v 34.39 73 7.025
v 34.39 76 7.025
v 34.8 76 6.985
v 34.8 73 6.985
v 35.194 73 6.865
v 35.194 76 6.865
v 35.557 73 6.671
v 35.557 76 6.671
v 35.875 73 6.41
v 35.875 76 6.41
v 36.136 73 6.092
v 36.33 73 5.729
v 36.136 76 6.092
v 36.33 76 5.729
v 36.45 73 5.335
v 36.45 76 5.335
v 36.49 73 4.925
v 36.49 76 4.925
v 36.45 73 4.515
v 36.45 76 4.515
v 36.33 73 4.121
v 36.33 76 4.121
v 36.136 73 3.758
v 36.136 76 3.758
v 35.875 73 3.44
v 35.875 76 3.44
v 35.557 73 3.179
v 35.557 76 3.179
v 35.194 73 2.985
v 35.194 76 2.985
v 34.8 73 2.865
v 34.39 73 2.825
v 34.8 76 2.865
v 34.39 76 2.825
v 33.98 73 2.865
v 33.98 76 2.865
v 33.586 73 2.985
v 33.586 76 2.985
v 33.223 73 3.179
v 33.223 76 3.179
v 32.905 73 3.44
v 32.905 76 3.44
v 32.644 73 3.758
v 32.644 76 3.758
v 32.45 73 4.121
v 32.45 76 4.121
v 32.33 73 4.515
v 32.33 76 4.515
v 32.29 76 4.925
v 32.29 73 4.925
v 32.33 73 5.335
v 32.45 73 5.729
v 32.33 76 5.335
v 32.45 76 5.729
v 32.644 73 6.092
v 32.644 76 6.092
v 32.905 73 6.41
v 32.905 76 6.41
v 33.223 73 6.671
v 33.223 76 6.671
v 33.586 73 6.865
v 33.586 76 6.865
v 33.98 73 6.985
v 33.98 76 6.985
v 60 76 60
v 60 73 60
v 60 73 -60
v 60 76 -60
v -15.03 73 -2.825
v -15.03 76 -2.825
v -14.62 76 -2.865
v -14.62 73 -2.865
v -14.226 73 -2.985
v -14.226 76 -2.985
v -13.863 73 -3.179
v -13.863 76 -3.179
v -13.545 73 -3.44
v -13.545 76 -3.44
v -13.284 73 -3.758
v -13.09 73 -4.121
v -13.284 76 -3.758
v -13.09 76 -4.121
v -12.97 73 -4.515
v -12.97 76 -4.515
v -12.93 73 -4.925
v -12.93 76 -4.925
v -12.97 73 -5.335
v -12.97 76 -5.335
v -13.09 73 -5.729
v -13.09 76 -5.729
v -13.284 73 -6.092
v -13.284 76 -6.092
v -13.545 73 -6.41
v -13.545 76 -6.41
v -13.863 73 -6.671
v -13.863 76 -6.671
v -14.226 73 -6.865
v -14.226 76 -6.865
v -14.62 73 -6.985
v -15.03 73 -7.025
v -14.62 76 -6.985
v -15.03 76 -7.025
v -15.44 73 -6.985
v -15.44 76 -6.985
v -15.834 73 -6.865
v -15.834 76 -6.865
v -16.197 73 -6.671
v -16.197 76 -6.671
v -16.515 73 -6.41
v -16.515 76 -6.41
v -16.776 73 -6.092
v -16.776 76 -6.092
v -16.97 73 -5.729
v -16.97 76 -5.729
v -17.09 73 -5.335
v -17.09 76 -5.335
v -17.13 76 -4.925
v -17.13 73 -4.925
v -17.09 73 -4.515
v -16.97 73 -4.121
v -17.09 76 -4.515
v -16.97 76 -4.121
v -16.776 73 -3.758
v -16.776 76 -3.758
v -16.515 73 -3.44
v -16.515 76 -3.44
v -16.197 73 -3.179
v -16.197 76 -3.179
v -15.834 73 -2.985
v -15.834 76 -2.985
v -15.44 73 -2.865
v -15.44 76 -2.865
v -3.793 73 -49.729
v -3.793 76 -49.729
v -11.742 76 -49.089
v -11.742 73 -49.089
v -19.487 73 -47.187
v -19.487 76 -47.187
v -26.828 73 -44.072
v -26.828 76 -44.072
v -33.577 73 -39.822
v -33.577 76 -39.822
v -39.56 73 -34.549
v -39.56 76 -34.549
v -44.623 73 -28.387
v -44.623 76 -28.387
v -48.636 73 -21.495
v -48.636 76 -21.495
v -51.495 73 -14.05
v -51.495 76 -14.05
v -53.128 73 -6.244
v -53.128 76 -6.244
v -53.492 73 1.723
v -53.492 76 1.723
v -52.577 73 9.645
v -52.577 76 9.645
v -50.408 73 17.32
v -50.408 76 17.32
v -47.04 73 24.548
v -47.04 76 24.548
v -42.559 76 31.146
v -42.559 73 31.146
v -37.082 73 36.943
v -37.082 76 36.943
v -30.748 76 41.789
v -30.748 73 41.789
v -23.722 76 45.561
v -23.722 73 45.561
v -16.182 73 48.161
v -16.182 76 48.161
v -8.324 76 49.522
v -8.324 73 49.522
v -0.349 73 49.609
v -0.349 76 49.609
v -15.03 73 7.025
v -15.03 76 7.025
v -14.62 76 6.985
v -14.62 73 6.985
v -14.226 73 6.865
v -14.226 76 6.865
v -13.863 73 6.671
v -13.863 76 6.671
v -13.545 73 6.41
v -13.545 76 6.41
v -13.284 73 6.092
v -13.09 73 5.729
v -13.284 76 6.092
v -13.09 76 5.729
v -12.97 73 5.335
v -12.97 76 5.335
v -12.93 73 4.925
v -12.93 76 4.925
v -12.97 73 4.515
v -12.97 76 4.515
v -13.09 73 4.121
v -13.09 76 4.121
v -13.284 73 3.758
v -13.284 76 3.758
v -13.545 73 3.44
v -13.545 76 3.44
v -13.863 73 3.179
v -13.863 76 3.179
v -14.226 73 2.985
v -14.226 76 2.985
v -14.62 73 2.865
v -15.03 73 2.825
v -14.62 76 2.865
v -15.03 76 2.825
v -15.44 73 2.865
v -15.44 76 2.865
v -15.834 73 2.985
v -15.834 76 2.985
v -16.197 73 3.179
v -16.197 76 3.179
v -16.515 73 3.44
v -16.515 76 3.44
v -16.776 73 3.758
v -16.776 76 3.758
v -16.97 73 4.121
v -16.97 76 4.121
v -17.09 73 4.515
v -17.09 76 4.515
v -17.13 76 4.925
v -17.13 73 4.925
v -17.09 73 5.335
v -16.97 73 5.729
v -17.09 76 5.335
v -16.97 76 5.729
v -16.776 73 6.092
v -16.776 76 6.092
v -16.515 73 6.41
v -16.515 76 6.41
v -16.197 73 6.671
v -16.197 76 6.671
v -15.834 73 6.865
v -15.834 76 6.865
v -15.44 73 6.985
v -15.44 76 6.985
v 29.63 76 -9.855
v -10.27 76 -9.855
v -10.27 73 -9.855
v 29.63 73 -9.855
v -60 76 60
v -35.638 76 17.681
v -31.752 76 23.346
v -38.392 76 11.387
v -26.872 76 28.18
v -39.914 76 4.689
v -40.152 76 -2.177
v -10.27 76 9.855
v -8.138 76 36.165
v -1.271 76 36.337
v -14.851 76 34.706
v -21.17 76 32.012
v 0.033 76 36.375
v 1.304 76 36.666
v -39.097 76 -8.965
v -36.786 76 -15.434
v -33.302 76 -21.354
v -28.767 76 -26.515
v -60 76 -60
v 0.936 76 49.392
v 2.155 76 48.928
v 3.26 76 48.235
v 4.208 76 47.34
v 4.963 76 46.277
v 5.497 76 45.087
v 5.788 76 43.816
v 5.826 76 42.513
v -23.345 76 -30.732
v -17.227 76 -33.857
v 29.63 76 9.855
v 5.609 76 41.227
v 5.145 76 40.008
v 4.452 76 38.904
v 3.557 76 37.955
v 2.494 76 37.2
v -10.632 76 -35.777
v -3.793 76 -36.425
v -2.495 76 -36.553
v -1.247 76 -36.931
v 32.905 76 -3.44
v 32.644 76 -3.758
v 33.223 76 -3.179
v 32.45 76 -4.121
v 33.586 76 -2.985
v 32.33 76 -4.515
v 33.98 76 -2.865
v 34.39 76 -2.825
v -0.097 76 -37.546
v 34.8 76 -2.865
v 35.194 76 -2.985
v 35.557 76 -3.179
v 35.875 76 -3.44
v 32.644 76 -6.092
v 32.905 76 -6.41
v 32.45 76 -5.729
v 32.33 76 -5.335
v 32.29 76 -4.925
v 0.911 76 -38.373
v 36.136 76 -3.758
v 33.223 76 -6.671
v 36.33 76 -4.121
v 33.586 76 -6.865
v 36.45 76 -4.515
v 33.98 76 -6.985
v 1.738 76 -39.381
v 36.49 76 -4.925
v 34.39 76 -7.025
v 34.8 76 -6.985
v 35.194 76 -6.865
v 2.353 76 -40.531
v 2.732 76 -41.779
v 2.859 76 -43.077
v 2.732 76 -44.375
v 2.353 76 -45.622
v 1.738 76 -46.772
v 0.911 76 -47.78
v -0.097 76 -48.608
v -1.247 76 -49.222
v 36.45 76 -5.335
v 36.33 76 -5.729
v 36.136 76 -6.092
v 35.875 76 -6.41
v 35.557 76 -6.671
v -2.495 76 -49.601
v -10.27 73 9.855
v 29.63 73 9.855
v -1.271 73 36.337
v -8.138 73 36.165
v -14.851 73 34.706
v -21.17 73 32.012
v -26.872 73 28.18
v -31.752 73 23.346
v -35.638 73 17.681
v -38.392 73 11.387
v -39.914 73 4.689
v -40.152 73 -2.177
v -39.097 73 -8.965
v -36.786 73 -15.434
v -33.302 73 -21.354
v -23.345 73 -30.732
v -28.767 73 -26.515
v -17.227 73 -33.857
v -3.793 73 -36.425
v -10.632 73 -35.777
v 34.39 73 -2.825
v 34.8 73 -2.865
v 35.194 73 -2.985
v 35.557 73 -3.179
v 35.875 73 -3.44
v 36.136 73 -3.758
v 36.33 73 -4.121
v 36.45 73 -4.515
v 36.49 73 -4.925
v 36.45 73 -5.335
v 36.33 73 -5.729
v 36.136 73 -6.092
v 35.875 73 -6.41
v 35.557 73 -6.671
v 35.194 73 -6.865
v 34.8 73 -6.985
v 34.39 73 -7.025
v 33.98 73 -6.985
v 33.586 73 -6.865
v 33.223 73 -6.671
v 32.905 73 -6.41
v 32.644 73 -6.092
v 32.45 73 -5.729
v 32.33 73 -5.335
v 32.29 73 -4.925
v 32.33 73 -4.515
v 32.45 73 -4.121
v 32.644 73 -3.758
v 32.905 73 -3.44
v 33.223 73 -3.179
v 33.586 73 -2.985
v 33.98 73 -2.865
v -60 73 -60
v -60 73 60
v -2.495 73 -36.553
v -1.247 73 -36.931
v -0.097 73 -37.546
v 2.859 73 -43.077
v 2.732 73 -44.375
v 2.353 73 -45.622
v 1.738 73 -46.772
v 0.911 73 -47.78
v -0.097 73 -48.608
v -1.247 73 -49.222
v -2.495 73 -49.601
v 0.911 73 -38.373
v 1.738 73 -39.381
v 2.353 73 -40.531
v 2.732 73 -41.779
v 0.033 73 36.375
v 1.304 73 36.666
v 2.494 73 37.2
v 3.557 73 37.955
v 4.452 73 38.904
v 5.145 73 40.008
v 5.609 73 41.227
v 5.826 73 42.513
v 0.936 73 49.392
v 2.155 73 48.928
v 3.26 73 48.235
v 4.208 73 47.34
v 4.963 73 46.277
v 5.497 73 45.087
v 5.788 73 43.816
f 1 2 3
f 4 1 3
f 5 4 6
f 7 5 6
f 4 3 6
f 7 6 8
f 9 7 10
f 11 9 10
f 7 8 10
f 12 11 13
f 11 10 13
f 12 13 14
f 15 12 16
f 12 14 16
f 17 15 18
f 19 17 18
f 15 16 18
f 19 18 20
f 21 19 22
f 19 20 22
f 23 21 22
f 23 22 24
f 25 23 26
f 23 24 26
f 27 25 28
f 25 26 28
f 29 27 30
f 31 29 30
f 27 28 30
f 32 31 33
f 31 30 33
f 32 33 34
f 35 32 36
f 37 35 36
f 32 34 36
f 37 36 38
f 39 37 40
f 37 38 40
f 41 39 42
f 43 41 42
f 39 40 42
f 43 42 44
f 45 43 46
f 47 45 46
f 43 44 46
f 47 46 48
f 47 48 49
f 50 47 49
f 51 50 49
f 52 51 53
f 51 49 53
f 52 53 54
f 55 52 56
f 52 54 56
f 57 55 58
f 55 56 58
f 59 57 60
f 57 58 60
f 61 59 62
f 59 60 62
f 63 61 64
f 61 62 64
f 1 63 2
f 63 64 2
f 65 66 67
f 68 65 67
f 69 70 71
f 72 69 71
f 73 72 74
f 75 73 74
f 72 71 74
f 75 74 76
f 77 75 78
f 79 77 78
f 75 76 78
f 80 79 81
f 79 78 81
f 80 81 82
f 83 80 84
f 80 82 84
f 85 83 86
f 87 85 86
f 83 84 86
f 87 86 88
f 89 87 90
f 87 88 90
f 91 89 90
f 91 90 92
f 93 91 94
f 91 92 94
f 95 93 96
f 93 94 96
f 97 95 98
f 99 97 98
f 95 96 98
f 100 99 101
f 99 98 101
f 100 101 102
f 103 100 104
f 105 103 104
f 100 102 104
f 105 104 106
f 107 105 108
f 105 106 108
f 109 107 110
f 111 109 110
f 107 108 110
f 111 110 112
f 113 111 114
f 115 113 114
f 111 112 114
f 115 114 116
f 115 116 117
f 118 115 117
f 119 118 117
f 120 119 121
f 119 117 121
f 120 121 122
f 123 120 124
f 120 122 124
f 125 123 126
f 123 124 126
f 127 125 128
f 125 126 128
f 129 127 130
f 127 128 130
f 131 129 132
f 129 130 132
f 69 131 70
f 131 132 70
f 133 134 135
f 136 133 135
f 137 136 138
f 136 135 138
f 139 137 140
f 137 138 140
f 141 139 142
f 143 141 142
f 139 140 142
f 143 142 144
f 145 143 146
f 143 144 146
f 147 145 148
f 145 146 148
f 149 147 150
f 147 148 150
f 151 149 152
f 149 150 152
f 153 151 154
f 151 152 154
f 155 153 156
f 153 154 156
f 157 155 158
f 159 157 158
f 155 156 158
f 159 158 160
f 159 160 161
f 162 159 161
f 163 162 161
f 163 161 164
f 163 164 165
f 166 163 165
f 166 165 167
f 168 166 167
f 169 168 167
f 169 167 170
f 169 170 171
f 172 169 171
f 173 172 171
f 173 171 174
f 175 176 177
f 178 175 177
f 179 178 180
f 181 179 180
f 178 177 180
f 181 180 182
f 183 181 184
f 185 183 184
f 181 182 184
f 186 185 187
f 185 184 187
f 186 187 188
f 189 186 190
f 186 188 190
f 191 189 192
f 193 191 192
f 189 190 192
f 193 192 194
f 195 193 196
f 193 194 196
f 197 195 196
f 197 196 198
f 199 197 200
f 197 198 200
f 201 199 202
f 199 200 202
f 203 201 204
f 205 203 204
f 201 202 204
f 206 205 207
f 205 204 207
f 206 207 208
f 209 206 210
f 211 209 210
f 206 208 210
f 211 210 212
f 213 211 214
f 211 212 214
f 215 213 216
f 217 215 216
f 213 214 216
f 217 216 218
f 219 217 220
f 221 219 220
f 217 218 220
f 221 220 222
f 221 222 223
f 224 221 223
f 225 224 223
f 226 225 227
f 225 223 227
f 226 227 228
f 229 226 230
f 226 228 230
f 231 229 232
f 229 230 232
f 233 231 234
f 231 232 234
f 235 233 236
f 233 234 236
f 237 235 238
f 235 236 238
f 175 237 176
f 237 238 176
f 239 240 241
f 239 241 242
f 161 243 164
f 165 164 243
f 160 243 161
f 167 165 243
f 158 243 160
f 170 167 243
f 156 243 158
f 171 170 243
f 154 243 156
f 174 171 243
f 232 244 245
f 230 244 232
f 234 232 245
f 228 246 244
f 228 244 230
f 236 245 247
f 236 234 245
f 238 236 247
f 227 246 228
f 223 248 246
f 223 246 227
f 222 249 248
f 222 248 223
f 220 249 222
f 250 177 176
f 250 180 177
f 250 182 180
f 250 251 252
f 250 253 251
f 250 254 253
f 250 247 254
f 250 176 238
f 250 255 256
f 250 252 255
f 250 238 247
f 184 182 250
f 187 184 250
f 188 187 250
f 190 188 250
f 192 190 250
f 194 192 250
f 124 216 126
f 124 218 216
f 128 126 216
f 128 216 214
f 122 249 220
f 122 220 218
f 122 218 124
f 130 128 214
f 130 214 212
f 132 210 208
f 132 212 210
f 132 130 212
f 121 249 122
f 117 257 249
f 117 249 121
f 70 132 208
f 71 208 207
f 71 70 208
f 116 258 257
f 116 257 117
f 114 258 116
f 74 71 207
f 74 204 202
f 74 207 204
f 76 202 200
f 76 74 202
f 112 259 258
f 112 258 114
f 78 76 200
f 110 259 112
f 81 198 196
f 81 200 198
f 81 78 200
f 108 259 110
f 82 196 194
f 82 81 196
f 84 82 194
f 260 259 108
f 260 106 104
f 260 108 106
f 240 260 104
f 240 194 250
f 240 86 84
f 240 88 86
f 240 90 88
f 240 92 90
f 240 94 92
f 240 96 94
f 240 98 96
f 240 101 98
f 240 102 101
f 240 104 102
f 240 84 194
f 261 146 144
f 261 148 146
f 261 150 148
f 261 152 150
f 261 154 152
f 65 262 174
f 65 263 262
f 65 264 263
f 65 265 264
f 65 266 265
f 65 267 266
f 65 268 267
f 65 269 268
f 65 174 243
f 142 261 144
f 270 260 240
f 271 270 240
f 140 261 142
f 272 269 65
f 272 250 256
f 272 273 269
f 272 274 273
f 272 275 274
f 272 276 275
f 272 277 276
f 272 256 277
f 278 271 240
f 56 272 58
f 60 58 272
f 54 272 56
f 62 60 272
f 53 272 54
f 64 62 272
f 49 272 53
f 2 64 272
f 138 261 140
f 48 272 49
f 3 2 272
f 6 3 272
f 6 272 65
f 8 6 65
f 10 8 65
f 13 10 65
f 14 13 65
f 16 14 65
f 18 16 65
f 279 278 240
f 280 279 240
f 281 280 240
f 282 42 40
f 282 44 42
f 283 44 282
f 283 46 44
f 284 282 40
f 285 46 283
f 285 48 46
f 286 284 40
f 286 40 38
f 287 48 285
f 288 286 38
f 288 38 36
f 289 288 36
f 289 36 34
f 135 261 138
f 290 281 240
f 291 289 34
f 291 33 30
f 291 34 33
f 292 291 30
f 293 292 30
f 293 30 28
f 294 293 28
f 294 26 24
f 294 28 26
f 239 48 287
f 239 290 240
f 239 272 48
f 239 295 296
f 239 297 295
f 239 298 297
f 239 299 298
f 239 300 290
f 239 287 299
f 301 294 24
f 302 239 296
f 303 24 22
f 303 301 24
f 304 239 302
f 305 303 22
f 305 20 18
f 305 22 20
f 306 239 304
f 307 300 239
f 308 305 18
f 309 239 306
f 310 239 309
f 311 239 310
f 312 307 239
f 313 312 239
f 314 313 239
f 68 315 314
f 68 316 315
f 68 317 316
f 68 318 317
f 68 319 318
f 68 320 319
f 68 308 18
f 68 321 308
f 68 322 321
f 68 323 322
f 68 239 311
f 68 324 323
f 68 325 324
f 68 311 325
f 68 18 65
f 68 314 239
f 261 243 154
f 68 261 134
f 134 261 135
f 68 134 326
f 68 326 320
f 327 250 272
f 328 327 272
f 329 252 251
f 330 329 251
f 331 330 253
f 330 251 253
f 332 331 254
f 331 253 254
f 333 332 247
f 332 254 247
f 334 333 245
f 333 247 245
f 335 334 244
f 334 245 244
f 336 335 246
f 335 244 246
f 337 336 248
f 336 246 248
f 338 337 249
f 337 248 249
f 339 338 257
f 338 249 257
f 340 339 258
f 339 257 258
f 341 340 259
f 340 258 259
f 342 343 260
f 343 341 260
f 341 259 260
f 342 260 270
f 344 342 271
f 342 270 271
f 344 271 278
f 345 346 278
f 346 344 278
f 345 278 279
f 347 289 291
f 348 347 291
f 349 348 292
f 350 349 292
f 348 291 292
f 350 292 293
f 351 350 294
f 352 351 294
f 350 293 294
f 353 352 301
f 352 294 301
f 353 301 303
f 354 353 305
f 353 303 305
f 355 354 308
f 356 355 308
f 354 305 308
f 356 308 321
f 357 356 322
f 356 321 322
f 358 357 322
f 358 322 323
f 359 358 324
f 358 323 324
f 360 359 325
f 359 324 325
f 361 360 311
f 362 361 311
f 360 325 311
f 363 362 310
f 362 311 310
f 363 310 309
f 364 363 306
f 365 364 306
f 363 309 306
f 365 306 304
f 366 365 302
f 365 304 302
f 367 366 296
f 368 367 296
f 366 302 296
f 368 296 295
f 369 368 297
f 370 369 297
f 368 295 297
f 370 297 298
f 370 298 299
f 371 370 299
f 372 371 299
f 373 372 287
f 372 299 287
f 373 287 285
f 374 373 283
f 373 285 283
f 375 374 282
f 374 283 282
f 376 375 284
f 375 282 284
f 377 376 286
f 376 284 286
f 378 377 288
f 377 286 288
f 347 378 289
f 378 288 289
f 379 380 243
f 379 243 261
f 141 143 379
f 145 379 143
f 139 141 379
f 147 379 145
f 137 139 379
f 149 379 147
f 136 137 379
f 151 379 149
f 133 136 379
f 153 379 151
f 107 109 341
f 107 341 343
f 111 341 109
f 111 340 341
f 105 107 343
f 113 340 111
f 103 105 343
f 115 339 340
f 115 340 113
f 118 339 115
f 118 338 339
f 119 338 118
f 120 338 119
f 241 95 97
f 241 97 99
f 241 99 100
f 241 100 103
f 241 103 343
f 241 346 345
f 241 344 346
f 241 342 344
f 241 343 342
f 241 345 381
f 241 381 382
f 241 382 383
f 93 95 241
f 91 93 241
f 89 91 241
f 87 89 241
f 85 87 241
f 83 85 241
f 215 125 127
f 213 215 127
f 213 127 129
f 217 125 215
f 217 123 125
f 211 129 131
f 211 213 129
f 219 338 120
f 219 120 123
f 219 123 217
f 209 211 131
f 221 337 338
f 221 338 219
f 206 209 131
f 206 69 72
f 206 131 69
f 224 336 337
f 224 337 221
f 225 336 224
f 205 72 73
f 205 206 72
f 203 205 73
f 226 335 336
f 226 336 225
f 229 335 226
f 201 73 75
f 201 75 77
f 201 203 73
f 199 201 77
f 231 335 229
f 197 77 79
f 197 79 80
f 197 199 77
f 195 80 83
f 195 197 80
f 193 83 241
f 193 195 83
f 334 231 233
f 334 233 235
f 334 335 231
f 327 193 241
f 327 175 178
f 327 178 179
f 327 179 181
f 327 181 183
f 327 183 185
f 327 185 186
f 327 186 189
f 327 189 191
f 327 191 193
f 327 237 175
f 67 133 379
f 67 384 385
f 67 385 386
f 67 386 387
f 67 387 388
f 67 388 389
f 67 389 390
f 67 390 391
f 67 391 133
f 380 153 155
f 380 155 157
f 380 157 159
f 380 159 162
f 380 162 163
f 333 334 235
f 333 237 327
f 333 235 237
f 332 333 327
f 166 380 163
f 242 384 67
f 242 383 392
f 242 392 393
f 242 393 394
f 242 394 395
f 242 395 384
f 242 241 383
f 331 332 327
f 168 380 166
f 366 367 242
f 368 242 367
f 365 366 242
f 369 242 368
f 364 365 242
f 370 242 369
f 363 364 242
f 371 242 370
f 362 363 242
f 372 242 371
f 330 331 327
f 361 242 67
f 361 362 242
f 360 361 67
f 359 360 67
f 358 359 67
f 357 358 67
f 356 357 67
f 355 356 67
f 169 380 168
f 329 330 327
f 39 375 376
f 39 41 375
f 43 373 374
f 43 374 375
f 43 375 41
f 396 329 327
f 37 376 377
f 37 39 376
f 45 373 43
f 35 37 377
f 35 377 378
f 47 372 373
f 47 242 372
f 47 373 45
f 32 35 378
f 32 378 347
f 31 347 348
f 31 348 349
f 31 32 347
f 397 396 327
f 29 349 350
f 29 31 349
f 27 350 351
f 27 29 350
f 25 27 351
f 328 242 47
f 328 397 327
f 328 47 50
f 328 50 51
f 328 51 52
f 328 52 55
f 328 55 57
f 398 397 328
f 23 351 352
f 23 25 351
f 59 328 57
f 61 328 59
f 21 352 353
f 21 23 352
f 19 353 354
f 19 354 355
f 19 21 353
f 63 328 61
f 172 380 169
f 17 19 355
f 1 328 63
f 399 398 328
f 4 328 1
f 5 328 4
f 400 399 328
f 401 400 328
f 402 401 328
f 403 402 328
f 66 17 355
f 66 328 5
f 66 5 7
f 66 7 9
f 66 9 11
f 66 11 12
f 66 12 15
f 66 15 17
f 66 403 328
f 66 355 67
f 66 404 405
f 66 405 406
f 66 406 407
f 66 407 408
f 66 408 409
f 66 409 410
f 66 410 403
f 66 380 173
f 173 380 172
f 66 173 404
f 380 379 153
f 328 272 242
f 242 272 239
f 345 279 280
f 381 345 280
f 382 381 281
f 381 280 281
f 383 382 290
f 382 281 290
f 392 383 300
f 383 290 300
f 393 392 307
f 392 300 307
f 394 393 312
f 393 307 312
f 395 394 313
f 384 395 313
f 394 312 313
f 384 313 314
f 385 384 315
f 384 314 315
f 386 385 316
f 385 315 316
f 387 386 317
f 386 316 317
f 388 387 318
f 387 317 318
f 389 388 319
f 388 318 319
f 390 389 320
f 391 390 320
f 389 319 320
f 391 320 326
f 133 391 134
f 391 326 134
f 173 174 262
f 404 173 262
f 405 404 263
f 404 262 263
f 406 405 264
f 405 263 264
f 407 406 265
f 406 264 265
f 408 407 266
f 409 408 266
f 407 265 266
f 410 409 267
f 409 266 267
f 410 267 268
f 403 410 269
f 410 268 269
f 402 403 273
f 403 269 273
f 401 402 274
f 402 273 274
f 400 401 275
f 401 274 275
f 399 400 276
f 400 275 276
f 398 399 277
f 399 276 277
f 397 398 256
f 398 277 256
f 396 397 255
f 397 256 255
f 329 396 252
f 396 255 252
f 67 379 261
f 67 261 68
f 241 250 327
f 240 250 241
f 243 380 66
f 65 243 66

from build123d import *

# Parameters (mm, degrees)
SKETCH1_W           = 140
SKETCH1_H           = 160
BOSS_EXTRUDE1_DEPTH = 3
SKETCH2_W           = 120
SKETCH2_H           = 120
SKETCH2_W_2         = 117
SKETCH2_H_2         = 117
BOSS_EXTRUDE2_DEPTH = 70
SKETCH4_W           = 120
SKETCH4_H           = 120
BOSS_EXTRUDE4_DEPTH = 3
SKETCH5_R           = 2.1
SKETCH5_W           = 39.9
SKETCH5_H           = 19.71
CUT_EXTRUDE2_DEPTH  = 3
SKETCH6_W           = 18.298163042
SKETCH6_H           = 17.309993256
CUT_EXTRUDE3_DEPTH  = 3
CUT_EXTRUDE8_DEPTH  = 5
SKETCH15_W          = 259.021634325
SKETCH15_H          = 180.269434884
BOSS_EXTRUDE5_DEPTH = 3
SKETCH18_R          = 1.6
CUT_EXTRUDE9_DEPTH  = 10
SKETCH19_W          = 12
SKETCH19_H          = 4.5
SKETCH19_H_2        = 8.4
SKETCH19_W_2        = 10.084057066
SKETCH19_H_3        = 7.362028533
CUT_EXTRUDE11_DEPTH = 5
SKETCH20_W          = 298.828856564
SKETCH20_H          = 90.290314023
CUT_EXTRUDE12_DEPTH = 233.259150239
SKETCH21_W          = 285.29336792
SKETCH21_H          = 107.84761331
CUT_EXTRUDE13_DEPTH = 210.645587699


with BuildPart() as part:
    # Sketch1 → Boss-Extrude1 (new body)
    with BuildSketch(Plane(origin=(0, 0, 0), x_dir=(1, 0, 0), z_dir=(0, 1, 0))):
        Rectangle(SKETCH1_W, SKETCH1_H)
    extrude(amount=BOSS_EXTRUDE1_DEPTH)

    # Sketch2 → Boss-Extrude2 (add)
    with BuildSketch(Plane(origin=(0, 3, 0), x_dir=(1, 0, 0), z_dir=(0, 1, 0))):
        Rectangle(SKETCH2_W, SKETCH2_H)
        Rectangle(SKETCH2_W_2, SKETCH2_H_2, mode=Mode.SUBTRACT)
    extrude(amount=BOSS_EXTRUDE2_DEPTH)

    # Sketch4 → Boss-Extrude4 (add)
    with BuildSketch(Plane(origin=(0, 73, 0), x_dir=(1, 0, 0), z_dir=(0, 1, 0))):
        Rectangle(SKETCH4_W, SKETCH4_H)
    extrude(amount=BOSS_EXTRUDE4_DEPTH)

    # Sketch5 → Cut-Extrude2 (cut)
    with BuildSketch(Plane(origin=(0, 76, 0), x_dir=(1, 0, 0), z_dir=(0, 1, 0))):
        with Locations(Location((34.39, -4.925, 0), (0, 0, 270))):
            Circle(SKETCH5_R)
        with Locations(Location((34.39, 4.925, 0), (0, 0, 270))):
            Circle(SKETCH5_R)
        with Locations(Location((-15.03, -4.925, 0), (0, 0, 270))):
            Circle(SKETCH5_R)
        with Locations(Location((-15.03, 4.925, 0), (0, 0, 270))):
            Circle(SKETCH5_R)
        with Locations((9.68, 0)):
            Rectangle(SKETCH5_W, SKETCH5_H)
    extrude(amount=-CUT_EXTRUDE2_DEPTH, mode=Mode.SUBTRACT)

    # Sketch6 → Cut-Extrude3 (cut)
    with BuildSketch(Plane(origin=(0, 76, 0), x_dir=(1, 0, 0), z_dir=(0, 1, 0))):
        Rectangle(SKETCH6_W, SKETCH6_H)
    extrude(amount=-CUT_EXTRUDE3_DEPTH, mode=Mode.SUBTRACT)

    # Sketch13 → Cut-Extrude8 (cut)
    with BuildSketch(Plane(origin=(0, 76, 0), x_dir=(1, 0, 0), z_dir=(0, 1, 0))):
        with BuildLine():
            ThreePointArc((-3.792582359, 49.728765052), (-53.491503795, -1.722579942), (-0.349490011, -49.609426409))
            ThreePointArc((-0.349490011, -49.609426409), (5.82592347, -42.51288634), (-1.270616599, -36.337472859))
            ThreePointArc((-1.270616599, -36.337472859), (-40.195607742, -1.261740085), (-3.792582359, 36.42488497))
            ThreePointArc((-3.792582359, 36.42488497), (2.859357682, 43.076825011), (-3.792582359, 49.728765052))
        make_face()
    extrude(amount=-CUT_EXTRUDE8_DEPTH, mode=Mode.SUBTRACT)

    # Sketch15 → Boss-Extrude5 (add)
    with BuildSketch(Plane(origin=(0, 3, 0), x_dir=(1, 0, 0), z_dir=(0, 1, 0))):
        with Locations((-39.510817163, -10.134717442)):
            Rectangle(SKETCH15_W, SKETCH15_H)
    extrude(amount=-BOSS_EXTRUDE5_DEPTH)

    # Sketch18 → Cut-Extrude9 (cut)
    with BuildSketch(Plane(origin=(0, 3, 0), x_dir=(1, 0, 0), z_dir=(0, 1, 0))):
        with Locations(Location((-55.452, -27.227420358, 0), (0, 0, 270))):
            Circle(SKETCH18_R)
        with Locations(Location((-55.452, 32.208579642, 0), (0, 0, 270))):
            Circle(SKETCH18_R)
        with Locations(Location((4.746, 32.208579642, 0), (0, 0, 270))):
            Circle(SKETCH18_R)
        with Locations(Location((4.746, -27.227420358, 0), (0, 0, 270))):
            Circle(SKETCH18_R)
    extrude(amount=-CUT_EXTRUDE9_DEPTH, mode=Mode.SUBTRACT)

    # Sketch19 → Cut-Extrude11 (cut)
    with BuildSketch(Plane.ZY.offset(60)):
        with Locations((12.367420358, 33)):
            Rectangle(SKETCH19_W, SKETCH19_H)
        with Locations((-11.259414931, 37.2)):
            Rectangle(SKETCH19_W, SKETCH19_H_2)
        with Locations((-28.606781654, 36.742945388)):
            Rectangle(SKETCH19_W_2, SKETCH19_H_3)
    extrude(amount=-CUT_EXTRUDE11_DEPTH, mode=Mode.SUBTRACT)

    # Sketch20 → Cut-Extrude12 (cut, through all)
    with BuildSketch(Plane.XY.offset(60)):
        with Locations((-35.656907555, 27.854842988)):
            Rectangle(SKETCH20_W, SKETCH20_H)
    extrude(amount=-CUT_EXTRUDE12_DEPTH, mode=Mode.SUBTRACT)


with BuildPart() as cut_extrude12_piece_1:
    # of the separate pieces the step leaves, piece 1, a body of its own (cut_extrude12_pieces)
    add(part.part.solids().sort_by_distance((60, 76, 60))[0])


with BuildPart() as cut_extrude12_piece_2:
    # of the separate pieces the step leaves, piece 2, a body of its own (cut_extrude12_pieces)
    add(part.part.solids().sort_by_distance((90, 0, 60))[0])

    # Sketch21 → Cut-Extrude13 (cut, through all)
    with BuildSketch(Plane(origin=(0, 3, 0), x_dir=(1, 0, 0), z_dir=(0, 1, 0))):
        with Locations((-30.056705319, -107.088557651)):
            Rectangle(SKETCH21_W, SKETCH21_H)
    extrude(amount=-CUT_EXTRUDE13_DEPTH, mode=Mode.SUBTRACT)


solid = cut_extrude12_piece_1.part
